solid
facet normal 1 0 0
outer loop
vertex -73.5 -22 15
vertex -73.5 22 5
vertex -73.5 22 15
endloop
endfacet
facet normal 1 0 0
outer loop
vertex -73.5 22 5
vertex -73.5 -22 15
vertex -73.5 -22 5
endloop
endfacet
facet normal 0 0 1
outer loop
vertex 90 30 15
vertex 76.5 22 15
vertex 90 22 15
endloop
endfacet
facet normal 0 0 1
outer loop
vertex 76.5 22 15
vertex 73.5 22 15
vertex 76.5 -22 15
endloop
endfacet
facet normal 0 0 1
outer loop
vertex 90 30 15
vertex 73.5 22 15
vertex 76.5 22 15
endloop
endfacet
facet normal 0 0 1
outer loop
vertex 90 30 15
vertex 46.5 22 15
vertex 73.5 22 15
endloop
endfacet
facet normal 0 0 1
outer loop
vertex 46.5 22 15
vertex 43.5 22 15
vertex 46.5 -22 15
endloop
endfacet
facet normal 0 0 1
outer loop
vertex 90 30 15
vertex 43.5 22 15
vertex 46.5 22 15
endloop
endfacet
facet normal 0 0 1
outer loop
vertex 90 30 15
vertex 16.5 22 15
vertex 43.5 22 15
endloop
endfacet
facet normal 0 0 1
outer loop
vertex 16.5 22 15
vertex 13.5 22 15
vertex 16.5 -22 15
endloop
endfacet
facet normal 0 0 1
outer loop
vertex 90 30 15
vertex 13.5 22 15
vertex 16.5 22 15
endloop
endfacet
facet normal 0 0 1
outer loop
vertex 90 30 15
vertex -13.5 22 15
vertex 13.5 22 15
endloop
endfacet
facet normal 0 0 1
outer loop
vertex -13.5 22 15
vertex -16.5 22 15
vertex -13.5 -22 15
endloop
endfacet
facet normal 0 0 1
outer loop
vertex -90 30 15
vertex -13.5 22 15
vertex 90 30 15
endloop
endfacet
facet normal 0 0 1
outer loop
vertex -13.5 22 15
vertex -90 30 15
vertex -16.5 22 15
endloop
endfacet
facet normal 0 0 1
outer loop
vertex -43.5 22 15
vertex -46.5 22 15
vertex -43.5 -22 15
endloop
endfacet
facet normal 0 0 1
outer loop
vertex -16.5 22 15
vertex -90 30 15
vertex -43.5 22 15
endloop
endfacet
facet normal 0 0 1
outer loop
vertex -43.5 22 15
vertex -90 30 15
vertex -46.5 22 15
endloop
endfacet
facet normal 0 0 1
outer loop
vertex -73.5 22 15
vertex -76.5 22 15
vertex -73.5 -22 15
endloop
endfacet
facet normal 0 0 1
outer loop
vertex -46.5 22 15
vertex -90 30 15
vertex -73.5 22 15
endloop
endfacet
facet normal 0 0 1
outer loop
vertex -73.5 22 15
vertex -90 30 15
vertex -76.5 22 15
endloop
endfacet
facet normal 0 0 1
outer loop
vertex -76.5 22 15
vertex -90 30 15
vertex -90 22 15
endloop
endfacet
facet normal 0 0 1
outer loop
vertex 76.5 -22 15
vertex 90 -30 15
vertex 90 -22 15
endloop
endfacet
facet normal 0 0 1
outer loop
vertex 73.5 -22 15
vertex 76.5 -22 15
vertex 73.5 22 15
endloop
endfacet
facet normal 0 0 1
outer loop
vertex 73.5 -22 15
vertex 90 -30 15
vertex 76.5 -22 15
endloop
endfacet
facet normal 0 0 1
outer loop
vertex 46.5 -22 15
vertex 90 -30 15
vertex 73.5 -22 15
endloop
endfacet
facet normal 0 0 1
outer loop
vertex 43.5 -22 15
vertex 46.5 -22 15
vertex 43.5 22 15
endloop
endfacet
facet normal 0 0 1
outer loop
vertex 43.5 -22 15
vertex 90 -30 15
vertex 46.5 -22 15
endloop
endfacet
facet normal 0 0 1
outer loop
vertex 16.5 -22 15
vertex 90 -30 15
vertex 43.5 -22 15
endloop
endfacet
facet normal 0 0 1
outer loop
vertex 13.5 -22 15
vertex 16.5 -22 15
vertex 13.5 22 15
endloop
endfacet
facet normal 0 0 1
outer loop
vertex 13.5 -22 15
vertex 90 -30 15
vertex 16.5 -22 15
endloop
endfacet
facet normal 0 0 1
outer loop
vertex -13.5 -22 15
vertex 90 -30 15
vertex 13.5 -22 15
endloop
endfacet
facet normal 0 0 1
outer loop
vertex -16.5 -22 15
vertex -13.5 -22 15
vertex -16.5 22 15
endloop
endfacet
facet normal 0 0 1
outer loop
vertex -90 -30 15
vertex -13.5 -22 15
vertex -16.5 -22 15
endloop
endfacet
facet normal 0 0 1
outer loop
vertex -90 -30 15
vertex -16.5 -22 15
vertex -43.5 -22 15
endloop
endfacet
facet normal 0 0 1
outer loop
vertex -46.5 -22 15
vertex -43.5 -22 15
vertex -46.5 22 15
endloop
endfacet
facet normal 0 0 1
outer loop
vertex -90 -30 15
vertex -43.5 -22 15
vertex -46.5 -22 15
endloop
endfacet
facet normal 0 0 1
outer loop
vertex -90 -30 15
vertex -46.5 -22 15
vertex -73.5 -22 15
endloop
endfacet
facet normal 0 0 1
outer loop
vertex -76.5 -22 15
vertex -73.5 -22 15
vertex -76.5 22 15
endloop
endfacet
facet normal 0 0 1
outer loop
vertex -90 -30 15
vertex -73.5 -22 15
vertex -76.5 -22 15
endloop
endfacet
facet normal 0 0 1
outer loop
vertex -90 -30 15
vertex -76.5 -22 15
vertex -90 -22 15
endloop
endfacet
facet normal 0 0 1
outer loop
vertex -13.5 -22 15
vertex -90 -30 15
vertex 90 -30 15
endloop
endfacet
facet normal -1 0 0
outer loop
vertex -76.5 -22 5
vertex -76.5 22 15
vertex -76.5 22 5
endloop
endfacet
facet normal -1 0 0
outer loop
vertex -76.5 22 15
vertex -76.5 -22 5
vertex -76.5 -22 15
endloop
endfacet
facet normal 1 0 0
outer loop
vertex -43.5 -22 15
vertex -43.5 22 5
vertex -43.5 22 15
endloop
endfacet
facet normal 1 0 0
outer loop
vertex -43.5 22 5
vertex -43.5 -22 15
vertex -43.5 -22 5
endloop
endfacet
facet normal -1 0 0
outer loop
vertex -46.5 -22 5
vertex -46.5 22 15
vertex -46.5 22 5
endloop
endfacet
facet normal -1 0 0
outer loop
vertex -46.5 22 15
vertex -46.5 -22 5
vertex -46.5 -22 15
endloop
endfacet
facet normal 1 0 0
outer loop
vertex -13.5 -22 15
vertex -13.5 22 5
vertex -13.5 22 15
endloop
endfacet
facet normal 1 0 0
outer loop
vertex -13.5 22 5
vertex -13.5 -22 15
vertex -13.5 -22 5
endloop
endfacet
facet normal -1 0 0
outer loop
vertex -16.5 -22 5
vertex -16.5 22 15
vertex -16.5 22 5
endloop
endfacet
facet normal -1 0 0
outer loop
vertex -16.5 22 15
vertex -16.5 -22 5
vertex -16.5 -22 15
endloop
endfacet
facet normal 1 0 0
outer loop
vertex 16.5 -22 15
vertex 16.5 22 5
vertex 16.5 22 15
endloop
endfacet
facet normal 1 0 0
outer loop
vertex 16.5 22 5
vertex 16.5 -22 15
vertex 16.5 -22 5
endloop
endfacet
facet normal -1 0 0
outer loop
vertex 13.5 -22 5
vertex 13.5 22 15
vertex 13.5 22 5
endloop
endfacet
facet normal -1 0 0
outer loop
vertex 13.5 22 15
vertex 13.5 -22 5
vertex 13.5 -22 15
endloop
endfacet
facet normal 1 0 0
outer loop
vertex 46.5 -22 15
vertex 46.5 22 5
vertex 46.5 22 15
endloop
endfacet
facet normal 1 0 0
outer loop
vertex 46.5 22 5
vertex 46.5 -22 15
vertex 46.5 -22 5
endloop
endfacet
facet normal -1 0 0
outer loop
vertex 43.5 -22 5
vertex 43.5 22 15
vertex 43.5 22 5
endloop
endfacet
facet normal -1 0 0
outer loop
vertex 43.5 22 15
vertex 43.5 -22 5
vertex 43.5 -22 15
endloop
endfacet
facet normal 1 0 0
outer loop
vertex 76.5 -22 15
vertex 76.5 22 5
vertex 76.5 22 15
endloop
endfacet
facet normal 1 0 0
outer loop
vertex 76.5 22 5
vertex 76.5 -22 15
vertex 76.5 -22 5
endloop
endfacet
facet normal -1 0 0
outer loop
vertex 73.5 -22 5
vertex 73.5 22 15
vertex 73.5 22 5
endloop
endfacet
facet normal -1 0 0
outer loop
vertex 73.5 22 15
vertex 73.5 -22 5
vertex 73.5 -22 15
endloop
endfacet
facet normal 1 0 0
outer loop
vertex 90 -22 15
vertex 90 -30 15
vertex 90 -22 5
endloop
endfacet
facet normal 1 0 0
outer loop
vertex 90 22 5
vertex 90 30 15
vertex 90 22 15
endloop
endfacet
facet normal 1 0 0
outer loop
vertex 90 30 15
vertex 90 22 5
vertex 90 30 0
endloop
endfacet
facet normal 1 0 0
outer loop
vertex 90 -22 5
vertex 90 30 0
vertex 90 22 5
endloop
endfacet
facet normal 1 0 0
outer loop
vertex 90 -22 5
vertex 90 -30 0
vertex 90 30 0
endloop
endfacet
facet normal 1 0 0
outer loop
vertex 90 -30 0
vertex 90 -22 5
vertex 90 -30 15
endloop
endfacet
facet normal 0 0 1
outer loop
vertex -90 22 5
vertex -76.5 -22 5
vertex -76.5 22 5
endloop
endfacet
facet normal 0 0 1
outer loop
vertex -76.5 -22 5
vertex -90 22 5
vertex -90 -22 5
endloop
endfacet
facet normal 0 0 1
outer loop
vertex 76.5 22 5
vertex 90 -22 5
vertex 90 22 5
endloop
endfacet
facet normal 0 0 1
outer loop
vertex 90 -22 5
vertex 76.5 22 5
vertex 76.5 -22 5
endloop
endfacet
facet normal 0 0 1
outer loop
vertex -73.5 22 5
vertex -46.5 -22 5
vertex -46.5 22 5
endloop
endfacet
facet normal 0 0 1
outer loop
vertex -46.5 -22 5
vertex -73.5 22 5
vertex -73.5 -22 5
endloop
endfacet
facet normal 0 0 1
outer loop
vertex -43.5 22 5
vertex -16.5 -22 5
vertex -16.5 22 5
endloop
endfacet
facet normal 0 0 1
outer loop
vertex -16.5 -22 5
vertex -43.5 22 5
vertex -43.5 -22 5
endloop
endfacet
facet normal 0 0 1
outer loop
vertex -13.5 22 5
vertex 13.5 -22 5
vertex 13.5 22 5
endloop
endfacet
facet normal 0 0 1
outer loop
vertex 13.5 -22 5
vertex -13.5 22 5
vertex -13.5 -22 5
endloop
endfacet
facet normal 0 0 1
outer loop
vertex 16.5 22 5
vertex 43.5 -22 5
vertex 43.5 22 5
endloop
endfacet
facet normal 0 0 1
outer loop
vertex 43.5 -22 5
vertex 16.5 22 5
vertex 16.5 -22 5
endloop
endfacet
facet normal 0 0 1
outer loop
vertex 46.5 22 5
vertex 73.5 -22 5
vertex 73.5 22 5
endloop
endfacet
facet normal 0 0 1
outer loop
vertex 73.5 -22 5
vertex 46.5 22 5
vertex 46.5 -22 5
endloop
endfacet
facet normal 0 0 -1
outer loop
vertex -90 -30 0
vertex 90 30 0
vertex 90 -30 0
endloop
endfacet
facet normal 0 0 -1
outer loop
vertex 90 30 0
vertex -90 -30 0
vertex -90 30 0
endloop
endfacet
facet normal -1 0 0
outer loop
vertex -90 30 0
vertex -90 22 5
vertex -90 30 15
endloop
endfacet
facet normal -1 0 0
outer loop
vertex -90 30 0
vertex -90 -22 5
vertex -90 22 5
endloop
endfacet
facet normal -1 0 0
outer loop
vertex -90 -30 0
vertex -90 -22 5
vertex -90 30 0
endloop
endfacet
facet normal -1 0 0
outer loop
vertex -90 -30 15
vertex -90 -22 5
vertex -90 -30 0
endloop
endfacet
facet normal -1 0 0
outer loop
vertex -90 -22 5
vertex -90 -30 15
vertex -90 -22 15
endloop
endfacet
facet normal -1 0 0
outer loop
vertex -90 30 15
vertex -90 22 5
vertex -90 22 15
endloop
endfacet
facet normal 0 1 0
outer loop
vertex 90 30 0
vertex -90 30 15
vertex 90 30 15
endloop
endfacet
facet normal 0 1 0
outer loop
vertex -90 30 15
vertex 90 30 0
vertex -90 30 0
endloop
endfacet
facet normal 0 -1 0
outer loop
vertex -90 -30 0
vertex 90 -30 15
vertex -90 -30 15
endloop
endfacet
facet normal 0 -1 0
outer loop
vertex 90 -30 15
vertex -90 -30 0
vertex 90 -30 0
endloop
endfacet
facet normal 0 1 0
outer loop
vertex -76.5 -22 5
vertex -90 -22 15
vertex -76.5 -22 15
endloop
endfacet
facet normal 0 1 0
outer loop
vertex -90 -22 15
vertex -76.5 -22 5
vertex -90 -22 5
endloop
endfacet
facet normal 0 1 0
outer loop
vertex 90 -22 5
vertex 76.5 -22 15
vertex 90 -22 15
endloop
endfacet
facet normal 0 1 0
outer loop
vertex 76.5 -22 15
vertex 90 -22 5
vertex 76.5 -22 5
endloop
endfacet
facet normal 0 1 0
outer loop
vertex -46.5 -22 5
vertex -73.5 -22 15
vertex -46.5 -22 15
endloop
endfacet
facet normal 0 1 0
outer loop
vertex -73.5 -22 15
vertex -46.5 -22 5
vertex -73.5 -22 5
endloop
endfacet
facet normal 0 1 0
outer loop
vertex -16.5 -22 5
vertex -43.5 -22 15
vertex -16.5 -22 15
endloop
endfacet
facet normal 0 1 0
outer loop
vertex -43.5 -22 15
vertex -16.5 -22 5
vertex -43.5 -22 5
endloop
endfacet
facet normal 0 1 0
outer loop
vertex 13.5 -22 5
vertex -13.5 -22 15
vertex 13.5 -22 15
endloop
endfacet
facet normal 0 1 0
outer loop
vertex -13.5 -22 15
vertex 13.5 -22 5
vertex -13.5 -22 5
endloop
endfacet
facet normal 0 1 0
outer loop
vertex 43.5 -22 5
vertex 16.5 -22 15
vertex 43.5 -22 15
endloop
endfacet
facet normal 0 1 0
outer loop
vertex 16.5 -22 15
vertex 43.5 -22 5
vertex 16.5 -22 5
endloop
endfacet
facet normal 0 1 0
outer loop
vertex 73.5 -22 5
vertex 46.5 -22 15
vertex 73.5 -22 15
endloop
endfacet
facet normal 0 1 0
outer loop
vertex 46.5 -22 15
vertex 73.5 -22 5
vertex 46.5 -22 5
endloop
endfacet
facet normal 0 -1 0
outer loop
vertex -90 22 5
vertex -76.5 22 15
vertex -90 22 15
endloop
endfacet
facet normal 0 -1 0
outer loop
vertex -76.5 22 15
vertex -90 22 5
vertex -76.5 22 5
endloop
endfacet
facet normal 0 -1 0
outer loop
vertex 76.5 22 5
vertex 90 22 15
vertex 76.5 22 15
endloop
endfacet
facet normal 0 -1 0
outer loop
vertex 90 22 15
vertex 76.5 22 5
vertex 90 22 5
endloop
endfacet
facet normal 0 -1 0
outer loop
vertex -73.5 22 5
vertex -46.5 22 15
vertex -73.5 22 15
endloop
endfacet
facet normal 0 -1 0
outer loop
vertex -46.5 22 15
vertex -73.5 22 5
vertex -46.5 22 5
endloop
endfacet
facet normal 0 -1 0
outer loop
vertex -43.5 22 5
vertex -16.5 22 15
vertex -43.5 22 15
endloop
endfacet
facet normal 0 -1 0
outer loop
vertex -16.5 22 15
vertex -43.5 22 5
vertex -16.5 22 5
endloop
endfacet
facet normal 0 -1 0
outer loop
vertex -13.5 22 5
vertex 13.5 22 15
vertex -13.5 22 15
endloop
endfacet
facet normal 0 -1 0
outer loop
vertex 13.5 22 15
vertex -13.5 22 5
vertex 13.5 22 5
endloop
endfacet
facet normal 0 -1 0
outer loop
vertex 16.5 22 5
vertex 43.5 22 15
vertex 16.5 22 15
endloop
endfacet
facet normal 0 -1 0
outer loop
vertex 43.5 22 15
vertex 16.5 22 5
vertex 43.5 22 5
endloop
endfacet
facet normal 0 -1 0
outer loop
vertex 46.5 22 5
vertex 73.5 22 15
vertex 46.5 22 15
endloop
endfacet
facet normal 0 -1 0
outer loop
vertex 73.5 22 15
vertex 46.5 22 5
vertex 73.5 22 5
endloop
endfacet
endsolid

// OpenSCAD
$fn = 32;

// ----------------------------------------------------------------------
// Rib frame 180 x 60 x 15
// 6 ribs at 30 mm pitch
// ----------------------------------------------------------------------

// --- parameters (mm) ---
frame = [180, 60, 5];  // base plate size (x, y, z)
rail_w = 8;            // side rail width
ribs = 6;              // number of ribs
rib_t = 3;             // rib thickness
rib_h = 10;            // rib height above the base plate
pitch = 30;            // pitch between rib centres

// --- derived feature positions (mm) ---
span = (ribs - 1) * pitch;          // = 150   distance between the outer ribs
origin_x = -span / 2;               // = -75   X of the first rib
rib_len = frame[1] - 2 * rail_w + 2;  // = 46   rib length, 1 mm into each rail
feature_centers = [
  [origin_x + 0 * pitch, 0],
  [origin_x + 1 * pitch, 0],
  [origin_x + 2 * pitch, 0],
  [origin_x + 3 * pitch, 0],
  [origin_x + 4 * pitch, 0],
  [origin_x + 5 * pitch, 0]
];   // rib centre line, drives the rib loop

// base plate, two side rails, then the ribs read straight off feature_centers
union() {
  translate([-frame[0] / 2, -frame[1] / 2, 0]) cube(frame);
  translate([-frame[0] / 2, -frame[1] / 2, 0]) cube([frame[0], rail_w, frame[2] + rib_h]);
  translate([-frame[0] / 2, frame[1] / 2 - rail_w, 0]) cube([frame[0], rail_w, frame[2] + rib_h]);
  for (centre = feature_centers)
    translate([centre[0] - rib_t / 2, centre[1] - rib_len / 2, frame[2] - 1])
      cube([rib_t, rib_len, rib_h + 1]);
}
